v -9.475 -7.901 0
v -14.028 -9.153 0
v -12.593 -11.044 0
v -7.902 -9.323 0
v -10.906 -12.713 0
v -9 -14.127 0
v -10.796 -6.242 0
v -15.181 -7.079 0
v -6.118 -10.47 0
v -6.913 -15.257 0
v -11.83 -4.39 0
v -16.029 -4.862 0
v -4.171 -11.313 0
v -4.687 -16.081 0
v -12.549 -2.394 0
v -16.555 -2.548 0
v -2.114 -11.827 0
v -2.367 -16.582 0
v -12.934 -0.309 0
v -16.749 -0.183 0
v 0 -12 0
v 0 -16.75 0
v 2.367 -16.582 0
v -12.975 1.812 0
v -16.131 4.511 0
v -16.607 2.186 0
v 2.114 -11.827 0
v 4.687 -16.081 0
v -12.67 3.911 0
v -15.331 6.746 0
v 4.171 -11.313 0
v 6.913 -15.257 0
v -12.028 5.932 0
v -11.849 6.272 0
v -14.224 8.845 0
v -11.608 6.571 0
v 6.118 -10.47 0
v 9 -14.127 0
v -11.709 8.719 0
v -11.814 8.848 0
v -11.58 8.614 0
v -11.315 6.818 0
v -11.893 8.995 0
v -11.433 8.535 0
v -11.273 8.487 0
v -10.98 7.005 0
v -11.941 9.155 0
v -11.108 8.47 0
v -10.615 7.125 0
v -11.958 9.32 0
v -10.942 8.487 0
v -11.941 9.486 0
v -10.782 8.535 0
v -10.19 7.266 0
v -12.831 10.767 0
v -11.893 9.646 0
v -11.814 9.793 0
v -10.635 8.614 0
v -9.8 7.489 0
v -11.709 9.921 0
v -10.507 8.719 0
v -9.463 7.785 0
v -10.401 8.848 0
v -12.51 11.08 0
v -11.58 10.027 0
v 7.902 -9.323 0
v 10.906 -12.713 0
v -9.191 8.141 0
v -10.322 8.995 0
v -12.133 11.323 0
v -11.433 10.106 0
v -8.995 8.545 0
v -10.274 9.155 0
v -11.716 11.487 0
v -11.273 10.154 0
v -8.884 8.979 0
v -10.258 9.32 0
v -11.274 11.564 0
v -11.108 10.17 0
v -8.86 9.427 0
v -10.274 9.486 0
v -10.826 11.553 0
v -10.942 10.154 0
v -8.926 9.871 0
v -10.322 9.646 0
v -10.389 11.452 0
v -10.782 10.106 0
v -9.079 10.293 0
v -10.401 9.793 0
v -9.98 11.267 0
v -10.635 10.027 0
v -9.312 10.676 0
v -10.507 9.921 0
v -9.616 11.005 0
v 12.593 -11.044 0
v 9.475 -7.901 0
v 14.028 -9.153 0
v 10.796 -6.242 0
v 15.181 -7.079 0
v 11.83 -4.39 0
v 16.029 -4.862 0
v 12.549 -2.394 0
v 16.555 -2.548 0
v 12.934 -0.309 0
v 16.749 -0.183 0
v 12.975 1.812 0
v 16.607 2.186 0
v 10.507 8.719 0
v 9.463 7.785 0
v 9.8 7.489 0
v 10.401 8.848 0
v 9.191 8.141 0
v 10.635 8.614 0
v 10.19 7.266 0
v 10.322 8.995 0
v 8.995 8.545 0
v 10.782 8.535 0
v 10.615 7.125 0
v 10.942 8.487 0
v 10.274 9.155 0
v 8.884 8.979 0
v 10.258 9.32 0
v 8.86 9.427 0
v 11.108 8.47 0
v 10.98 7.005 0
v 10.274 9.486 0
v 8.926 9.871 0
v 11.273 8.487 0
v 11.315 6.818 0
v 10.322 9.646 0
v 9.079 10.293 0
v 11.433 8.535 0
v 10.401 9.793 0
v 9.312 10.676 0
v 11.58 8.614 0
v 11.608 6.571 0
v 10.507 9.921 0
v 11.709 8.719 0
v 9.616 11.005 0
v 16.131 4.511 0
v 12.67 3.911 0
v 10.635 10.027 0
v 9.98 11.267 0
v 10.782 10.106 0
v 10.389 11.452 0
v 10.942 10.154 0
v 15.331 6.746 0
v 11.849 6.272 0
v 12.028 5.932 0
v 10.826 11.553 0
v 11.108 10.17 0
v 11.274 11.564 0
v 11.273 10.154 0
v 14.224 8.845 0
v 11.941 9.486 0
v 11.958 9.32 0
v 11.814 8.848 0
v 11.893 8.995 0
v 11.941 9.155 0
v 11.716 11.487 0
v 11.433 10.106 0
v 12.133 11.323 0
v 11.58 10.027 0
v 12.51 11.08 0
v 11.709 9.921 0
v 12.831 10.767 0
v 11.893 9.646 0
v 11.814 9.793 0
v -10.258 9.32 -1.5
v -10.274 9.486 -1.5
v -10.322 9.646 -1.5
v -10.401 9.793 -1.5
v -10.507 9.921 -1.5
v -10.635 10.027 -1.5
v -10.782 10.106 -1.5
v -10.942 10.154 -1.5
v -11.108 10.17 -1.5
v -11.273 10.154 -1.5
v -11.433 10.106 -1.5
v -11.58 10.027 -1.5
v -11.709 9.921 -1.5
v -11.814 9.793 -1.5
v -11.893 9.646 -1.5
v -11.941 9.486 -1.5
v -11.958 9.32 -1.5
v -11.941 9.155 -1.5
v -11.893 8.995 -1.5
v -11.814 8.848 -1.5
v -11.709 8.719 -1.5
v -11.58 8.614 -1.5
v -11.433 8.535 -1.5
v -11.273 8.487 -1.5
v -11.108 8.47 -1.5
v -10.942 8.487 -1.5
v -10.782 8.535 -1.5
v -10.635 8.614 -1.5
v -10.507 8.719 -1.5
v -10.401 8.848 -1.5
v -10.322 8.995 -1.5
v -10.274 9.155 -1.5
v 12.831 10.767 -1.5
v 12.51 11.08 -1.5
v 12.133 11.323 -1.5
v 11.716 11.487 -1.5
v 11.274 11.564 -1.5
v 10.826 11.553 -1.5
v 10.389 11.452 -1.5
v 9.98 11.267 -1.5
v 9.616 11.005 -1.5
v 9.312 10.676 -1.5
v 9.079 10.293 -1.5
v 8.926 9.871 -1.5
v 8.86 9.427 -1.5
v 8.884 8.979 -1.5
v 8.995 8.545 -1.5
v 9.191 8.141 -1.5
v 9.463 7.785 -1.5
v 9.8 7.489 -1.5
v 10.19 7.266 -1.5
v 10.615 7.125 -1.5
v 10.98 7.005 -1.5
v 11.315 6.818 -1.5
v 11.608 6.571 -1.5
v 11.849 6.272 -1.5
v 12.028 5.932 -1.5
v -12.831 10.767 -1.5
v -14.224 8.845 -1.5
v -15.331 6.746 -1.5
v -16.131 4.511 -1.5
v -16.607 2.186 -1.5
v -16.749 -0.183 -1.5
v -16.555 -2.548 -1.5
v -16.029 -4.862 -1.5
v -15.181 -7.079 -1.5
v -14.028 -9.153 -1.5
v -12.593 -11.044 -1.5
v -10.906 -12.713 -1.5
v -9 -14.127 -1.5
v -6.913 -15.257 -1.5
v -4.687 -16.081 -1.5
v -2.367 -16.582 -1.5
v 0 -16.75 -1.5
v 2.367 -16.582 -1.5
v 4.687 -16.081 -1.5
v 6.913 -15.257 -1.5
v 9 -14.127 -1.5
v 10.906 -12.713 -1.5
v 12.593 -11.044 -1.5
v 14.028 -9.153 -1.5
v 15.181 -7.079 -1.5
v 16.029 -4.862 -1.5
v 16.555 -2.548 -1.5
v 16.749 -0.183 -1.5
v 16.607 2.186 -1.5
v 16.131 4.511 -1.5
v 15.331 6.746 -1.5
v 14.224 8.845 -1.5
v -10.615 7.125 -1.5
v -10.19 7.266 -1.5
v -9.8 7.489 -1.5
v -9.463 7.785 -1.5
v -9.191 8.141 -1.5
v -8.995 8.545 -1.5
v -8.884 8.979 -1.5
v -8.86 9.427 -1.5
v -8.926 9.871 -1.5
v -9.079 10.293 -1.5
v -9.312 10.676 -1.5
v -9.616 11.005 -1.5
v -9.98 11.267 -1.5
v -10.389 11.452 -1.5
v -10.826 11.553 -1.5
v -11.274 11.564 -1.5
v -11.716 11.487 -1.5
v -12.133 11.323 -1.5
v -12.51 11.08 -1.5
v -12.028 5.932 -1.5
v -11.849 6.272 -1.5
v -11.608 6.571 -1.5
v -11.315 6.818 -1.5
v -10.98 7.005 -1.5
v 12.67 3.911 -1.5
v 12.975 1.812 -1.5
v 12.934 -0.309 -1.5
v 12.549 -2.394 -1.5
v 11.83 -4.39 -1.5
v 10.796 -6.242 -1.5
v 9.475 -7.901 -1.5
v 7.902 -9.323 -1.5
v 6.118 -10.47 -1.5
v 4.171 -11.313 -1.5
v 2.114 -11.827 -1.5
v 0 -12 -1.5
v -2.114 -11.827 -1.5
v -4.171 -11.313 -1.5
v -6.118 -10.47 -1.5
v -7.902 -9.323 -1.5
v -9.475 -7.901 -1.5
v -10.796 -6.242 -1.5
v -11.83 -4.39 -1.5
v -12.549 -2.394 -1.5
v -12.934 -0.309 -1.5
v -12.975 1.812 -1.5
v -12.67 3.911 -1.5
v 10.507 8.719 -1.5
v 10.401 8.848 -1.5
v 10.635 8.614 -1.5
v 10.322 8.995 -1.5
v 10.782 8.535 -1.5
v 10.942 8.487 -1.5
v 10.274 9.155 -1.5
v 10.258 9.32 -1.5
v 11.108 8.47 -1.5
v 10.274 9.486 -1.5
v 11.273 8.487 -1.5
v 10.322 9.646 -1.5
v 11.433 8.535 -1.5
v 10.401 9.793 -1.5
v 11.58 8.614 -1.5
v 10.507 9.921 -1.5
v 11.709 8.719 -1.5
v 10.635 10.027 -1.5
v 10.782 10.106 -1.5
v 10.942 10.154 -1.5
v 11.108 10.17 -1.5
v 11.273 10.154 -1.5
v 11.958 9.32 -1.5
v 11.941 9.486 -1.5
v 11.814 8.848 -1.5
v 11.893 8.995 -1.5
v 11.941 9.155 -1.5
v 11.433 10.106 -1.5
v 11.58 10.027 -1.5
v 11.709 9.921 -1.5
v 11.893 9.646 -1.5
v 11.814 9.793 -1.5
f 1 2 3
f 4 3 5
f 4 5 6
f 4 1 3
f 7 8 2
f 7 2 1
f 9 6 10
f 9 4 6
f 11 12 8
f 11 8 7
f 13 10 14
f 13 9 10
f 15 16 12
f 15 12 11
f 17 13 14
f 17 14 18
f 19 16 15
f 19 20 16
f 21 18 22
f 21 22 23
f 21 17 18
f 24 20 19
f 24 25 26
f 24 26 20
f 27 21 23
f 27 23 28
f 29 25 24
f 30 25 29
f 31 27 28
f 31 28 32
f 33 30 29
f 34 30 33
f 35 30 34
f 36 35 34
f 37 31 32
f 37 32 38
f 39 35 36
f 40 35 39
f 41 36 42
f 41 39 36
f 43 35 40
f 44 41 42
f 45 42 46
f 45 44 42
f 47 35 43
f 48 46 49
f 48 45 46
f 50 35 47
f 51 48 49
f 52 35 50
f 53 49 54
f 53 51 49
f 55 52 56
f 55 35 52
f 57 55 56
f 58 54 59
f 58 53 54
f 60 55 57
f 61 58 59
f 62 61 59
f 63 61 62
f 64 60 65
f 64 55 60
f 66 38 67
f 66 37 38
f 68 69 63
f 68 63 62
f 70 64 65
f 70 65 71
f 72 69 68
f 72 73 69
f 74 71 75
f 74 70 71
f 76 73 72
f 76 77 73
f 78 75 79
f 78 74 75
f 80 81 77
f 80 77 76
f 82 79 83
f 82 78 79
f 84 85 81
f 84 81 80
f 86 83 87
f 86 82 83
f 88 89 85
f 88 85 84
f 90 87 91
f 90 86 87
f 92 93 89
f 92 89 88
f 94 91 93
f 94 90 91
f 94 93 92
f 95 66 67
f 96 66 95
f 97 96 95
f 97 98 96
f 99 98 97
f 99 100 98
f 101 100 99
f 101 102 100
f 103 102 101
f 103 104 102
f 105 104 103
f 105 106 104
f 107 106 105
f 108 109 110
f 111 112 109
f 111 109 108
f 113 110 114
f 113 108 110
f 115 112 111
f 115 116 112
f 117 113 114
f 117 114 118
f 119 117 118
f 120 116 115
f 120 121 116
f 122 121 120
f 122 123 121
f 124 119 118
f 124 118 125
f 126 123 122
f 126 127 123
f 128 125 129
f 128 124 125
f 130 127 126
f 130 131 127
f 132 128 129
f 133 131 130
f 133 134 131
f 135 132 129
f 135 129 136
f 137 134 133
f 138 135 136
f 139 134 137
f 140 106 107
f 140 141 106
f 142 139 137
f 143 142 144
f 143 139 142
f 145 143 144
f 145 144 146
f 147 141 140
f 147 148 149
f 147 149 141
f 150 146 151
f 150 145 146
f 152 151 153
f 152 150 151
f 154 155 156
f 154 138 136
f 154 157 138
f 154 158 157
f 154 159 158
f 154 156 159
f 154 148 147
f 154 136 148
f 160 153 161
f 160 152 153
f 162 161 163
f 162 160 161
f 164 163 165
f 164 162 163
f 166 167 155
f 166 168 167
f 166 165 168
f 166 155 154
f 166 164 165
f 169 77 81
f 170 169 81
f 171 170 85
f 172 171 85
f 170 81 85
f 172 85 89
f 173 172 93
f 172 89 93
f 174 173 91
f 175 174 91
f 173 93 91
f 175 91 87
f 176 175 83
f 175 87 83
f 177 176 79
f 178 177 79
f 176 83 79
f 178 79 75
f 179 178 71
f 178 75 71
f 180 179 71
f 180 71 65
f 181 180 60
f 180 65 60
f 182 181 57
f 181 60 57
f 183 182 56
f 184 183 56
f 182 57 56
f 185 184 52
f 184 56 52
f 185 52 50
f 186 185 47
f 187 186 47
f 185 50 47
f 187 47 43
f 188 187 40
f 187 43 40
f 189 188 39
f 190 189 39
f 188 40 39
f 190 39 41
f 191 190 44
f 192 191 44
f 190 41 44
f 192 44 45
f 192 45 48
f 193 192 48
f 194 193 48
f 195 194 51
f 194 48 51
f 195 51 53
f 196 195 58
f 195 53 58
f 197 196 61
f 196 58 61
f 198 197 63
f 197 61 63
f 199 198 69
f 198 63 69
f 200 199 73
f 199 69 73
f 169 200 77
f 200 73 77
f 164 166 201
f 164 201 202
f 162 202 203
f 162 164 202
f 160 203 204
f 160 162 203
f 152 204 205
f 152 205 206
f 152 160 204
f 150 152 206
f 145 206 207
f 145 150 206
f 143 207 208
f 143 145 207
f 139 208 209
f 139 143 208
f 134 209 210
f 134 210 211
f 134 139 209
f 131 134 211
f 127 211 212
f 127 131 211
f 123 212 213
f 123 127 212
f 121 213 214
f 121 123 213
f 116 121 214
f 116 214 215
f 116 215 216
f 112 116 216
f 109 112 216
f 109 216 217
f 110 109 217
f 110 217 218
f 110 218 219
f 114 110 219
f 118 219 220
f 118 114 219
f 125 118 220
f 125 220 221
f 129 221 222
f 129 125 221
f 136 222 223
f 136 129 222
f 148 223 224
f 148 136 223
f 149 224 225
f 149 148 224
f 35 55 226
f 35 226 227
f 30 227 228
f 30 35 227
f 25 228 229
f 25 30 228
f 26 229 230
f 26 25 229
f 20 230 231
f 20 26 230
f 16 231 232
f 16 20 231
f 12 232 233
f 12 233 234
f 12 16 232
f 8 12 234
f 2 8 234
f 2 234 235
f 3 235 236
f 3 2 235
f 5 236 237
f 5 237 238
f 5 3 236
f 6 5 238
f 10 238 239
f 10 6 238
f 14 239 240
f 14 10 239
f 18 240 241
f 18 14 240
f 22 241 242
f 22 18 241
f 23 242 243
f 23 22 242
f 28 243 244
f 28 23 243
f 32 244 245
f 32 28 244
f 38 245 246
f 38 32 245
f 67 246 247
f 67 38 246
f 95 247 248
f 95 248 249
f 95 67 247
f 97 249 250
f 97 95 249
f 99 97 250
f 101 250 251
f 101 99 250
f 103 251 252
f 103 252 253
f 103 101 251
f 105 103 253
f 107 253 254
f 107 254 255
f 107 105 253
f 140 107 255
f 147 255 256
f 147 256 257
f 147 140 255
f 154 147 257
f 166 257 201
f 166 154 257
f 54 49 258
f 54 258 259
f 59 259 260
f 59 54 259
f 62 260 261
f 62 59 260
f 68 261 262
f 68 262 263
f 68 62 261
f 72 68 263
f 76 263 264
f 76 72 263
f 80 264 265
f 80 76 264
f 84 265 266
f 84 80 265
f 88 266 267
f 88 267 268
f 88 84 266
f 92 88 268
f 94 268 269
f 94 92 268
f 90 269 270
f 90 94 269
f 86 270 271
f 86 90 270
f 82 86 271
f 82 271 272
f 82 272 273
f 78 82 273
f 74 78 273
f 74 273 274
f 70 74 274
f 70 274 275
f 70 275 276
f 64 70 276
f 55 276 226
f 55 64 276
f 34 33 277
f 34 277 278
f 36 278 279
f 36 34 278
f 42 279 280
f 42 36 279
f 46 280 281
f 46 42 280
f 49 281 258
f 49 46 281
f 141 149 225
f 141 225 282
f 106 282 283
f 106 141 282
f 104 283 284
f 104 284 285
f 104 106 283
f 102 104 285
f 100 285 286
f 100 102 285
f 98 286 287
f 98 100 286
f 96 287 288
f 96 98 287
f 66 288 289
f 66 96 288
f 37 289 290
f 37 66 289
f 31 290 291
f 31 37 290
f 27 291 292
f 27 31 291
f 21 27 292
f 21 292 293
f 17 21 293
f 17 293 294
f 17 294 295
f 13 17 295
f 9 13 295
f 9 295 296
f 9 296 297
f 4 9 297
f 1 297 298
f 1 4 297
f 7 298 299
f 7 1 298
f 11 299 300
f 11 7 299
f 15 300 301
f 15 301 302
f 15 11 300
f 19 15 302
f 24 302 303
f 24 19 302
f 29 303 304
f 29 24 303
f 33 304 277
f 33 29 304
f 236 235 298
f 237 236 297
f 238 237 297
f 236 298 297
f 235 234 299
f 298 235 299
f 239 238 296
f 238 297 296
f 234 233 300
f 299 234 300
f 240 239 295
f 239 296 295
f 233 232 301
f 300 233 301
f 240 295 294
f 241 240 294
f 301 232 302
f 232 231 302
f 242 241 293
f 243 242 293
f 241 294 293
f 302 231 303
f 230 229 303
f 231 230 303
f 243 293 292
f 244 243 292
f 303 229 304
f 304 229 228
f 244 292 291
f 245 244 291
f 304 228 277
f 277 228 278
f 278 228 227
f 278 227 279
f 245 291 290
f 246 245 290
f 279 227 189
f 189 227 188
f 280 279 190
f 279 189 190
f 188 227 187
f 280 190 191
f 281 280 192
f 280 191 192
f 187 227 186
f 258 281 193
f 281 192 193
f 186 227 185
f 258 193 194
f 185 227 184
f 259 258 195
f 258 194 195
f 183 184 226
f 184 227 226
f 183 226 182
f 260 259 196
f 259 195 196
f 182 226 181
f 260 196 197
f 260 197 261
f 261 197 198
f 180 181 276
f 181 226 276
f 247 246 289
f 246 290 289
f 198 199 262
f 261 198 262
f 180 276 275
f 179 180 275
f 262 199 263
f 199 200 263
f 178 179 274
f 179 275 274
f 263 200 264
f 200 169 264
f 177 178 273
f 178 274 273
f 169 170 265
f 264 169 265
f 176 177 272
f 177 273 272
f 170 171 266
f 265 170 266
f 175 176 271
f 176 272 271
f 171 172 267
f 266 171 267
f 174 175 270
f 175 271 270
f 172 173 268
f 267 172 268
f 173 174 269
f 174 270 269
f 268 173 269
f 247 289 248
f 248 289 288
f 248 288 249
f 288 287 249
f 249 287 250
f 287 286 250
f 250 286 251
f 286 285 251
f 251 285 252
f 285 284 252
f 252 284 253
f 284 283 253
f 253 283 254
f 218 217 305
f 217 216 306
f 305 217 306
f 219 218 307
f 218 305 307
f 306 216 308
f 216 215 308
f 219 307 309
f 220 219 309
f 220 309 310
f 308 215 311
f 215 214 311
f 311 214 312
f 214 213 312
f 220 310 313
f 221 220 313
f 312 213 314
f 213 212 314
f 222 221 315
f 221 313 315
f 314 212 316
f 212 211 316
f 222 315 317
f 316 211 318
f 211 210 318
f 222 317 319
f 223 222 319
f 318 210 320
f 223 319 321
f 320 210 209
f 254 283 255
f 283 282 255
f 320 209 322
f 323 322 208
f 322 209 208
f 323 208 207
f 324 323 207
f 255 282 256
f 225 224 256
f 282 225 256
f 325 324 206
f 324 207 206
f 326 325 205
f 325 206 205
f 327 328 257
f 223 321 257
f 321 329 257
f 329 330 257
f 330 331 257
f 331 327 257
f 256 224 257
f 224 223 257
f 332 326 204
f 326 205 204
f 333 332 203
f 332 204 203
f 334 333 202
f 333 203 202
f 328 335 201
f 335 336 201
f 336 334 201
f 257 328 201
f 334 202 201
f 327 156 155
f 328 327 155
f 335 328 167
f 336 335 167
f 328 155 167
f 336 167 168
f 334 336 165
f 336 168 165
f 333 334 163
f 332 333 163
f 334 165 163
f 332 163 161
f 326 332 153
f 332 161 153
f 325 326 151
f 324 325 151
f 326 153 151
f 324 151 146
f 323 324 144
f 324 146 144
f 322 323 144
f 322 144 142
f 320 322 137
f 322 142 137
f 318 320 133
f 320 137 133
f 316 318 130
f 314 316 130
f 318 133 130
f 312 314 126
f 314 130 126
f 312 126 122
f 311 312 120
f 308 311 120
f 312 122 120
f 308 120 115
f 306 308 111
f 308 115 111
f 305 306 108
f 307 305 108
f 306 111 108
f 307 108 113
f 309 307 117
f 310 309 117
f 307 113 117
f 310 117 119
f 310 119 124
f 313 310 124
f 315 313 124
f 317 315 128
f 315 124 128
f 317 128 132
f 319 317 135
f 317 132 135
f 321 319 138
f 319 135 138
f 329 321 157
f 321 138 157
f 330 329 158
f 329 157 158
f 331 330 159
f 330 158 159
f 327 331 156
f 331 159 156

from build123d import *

# Parameters (mm, degrees)
SKETCH_1_R      = 0.85
EXTRUDE_1_DEPTH = 1.5


with BuildPart() as part:
    # Эскиз1 → Бобышка-Вытянуть1 (new body)
    with BuildSketch(Plane.XY):
        with BuildLine():
            ThreePointArc((-12.028004227, 5.932252459), (-11.46771854, 6.701660536), (-10.615237279, 7.124962483))
            ThreePointArc((-10.615237279, 7.124962483), (-9.185534057, 10.490032127), (-12.831244422, 10.766692462))
            ThreePointArc((-12.831244422, 10.766692462), (0, -16.75), (12.831244422, 10.766692462))
            ThreePointArc((12.831244422, 10.766692462), (9.185534057, 10.490032127), (10.615237279, 7.124962483))
            ThreePointArc((10.615237279, 7.124962483), (11.46771854, 6.701660536), (12.028004227, 5.932252459))
            ThreePointArc((12.028004227, 5.932252459), (0, -12), (-12.028004227, 5.932252459))
        make_face()
        with Locations((-11.107644425, 9.32042034)):
            Circle(SKETCH_1_R, mode=Mode.SUBTRACT)
        with Locations((11.107644425, 9.32042034)):
            Circle(SKETCH_1_R, mode=Mode.SUBTRACT)
    extrude(amount=-EXTRUDE_1_DEPTH)


solid = part.part
